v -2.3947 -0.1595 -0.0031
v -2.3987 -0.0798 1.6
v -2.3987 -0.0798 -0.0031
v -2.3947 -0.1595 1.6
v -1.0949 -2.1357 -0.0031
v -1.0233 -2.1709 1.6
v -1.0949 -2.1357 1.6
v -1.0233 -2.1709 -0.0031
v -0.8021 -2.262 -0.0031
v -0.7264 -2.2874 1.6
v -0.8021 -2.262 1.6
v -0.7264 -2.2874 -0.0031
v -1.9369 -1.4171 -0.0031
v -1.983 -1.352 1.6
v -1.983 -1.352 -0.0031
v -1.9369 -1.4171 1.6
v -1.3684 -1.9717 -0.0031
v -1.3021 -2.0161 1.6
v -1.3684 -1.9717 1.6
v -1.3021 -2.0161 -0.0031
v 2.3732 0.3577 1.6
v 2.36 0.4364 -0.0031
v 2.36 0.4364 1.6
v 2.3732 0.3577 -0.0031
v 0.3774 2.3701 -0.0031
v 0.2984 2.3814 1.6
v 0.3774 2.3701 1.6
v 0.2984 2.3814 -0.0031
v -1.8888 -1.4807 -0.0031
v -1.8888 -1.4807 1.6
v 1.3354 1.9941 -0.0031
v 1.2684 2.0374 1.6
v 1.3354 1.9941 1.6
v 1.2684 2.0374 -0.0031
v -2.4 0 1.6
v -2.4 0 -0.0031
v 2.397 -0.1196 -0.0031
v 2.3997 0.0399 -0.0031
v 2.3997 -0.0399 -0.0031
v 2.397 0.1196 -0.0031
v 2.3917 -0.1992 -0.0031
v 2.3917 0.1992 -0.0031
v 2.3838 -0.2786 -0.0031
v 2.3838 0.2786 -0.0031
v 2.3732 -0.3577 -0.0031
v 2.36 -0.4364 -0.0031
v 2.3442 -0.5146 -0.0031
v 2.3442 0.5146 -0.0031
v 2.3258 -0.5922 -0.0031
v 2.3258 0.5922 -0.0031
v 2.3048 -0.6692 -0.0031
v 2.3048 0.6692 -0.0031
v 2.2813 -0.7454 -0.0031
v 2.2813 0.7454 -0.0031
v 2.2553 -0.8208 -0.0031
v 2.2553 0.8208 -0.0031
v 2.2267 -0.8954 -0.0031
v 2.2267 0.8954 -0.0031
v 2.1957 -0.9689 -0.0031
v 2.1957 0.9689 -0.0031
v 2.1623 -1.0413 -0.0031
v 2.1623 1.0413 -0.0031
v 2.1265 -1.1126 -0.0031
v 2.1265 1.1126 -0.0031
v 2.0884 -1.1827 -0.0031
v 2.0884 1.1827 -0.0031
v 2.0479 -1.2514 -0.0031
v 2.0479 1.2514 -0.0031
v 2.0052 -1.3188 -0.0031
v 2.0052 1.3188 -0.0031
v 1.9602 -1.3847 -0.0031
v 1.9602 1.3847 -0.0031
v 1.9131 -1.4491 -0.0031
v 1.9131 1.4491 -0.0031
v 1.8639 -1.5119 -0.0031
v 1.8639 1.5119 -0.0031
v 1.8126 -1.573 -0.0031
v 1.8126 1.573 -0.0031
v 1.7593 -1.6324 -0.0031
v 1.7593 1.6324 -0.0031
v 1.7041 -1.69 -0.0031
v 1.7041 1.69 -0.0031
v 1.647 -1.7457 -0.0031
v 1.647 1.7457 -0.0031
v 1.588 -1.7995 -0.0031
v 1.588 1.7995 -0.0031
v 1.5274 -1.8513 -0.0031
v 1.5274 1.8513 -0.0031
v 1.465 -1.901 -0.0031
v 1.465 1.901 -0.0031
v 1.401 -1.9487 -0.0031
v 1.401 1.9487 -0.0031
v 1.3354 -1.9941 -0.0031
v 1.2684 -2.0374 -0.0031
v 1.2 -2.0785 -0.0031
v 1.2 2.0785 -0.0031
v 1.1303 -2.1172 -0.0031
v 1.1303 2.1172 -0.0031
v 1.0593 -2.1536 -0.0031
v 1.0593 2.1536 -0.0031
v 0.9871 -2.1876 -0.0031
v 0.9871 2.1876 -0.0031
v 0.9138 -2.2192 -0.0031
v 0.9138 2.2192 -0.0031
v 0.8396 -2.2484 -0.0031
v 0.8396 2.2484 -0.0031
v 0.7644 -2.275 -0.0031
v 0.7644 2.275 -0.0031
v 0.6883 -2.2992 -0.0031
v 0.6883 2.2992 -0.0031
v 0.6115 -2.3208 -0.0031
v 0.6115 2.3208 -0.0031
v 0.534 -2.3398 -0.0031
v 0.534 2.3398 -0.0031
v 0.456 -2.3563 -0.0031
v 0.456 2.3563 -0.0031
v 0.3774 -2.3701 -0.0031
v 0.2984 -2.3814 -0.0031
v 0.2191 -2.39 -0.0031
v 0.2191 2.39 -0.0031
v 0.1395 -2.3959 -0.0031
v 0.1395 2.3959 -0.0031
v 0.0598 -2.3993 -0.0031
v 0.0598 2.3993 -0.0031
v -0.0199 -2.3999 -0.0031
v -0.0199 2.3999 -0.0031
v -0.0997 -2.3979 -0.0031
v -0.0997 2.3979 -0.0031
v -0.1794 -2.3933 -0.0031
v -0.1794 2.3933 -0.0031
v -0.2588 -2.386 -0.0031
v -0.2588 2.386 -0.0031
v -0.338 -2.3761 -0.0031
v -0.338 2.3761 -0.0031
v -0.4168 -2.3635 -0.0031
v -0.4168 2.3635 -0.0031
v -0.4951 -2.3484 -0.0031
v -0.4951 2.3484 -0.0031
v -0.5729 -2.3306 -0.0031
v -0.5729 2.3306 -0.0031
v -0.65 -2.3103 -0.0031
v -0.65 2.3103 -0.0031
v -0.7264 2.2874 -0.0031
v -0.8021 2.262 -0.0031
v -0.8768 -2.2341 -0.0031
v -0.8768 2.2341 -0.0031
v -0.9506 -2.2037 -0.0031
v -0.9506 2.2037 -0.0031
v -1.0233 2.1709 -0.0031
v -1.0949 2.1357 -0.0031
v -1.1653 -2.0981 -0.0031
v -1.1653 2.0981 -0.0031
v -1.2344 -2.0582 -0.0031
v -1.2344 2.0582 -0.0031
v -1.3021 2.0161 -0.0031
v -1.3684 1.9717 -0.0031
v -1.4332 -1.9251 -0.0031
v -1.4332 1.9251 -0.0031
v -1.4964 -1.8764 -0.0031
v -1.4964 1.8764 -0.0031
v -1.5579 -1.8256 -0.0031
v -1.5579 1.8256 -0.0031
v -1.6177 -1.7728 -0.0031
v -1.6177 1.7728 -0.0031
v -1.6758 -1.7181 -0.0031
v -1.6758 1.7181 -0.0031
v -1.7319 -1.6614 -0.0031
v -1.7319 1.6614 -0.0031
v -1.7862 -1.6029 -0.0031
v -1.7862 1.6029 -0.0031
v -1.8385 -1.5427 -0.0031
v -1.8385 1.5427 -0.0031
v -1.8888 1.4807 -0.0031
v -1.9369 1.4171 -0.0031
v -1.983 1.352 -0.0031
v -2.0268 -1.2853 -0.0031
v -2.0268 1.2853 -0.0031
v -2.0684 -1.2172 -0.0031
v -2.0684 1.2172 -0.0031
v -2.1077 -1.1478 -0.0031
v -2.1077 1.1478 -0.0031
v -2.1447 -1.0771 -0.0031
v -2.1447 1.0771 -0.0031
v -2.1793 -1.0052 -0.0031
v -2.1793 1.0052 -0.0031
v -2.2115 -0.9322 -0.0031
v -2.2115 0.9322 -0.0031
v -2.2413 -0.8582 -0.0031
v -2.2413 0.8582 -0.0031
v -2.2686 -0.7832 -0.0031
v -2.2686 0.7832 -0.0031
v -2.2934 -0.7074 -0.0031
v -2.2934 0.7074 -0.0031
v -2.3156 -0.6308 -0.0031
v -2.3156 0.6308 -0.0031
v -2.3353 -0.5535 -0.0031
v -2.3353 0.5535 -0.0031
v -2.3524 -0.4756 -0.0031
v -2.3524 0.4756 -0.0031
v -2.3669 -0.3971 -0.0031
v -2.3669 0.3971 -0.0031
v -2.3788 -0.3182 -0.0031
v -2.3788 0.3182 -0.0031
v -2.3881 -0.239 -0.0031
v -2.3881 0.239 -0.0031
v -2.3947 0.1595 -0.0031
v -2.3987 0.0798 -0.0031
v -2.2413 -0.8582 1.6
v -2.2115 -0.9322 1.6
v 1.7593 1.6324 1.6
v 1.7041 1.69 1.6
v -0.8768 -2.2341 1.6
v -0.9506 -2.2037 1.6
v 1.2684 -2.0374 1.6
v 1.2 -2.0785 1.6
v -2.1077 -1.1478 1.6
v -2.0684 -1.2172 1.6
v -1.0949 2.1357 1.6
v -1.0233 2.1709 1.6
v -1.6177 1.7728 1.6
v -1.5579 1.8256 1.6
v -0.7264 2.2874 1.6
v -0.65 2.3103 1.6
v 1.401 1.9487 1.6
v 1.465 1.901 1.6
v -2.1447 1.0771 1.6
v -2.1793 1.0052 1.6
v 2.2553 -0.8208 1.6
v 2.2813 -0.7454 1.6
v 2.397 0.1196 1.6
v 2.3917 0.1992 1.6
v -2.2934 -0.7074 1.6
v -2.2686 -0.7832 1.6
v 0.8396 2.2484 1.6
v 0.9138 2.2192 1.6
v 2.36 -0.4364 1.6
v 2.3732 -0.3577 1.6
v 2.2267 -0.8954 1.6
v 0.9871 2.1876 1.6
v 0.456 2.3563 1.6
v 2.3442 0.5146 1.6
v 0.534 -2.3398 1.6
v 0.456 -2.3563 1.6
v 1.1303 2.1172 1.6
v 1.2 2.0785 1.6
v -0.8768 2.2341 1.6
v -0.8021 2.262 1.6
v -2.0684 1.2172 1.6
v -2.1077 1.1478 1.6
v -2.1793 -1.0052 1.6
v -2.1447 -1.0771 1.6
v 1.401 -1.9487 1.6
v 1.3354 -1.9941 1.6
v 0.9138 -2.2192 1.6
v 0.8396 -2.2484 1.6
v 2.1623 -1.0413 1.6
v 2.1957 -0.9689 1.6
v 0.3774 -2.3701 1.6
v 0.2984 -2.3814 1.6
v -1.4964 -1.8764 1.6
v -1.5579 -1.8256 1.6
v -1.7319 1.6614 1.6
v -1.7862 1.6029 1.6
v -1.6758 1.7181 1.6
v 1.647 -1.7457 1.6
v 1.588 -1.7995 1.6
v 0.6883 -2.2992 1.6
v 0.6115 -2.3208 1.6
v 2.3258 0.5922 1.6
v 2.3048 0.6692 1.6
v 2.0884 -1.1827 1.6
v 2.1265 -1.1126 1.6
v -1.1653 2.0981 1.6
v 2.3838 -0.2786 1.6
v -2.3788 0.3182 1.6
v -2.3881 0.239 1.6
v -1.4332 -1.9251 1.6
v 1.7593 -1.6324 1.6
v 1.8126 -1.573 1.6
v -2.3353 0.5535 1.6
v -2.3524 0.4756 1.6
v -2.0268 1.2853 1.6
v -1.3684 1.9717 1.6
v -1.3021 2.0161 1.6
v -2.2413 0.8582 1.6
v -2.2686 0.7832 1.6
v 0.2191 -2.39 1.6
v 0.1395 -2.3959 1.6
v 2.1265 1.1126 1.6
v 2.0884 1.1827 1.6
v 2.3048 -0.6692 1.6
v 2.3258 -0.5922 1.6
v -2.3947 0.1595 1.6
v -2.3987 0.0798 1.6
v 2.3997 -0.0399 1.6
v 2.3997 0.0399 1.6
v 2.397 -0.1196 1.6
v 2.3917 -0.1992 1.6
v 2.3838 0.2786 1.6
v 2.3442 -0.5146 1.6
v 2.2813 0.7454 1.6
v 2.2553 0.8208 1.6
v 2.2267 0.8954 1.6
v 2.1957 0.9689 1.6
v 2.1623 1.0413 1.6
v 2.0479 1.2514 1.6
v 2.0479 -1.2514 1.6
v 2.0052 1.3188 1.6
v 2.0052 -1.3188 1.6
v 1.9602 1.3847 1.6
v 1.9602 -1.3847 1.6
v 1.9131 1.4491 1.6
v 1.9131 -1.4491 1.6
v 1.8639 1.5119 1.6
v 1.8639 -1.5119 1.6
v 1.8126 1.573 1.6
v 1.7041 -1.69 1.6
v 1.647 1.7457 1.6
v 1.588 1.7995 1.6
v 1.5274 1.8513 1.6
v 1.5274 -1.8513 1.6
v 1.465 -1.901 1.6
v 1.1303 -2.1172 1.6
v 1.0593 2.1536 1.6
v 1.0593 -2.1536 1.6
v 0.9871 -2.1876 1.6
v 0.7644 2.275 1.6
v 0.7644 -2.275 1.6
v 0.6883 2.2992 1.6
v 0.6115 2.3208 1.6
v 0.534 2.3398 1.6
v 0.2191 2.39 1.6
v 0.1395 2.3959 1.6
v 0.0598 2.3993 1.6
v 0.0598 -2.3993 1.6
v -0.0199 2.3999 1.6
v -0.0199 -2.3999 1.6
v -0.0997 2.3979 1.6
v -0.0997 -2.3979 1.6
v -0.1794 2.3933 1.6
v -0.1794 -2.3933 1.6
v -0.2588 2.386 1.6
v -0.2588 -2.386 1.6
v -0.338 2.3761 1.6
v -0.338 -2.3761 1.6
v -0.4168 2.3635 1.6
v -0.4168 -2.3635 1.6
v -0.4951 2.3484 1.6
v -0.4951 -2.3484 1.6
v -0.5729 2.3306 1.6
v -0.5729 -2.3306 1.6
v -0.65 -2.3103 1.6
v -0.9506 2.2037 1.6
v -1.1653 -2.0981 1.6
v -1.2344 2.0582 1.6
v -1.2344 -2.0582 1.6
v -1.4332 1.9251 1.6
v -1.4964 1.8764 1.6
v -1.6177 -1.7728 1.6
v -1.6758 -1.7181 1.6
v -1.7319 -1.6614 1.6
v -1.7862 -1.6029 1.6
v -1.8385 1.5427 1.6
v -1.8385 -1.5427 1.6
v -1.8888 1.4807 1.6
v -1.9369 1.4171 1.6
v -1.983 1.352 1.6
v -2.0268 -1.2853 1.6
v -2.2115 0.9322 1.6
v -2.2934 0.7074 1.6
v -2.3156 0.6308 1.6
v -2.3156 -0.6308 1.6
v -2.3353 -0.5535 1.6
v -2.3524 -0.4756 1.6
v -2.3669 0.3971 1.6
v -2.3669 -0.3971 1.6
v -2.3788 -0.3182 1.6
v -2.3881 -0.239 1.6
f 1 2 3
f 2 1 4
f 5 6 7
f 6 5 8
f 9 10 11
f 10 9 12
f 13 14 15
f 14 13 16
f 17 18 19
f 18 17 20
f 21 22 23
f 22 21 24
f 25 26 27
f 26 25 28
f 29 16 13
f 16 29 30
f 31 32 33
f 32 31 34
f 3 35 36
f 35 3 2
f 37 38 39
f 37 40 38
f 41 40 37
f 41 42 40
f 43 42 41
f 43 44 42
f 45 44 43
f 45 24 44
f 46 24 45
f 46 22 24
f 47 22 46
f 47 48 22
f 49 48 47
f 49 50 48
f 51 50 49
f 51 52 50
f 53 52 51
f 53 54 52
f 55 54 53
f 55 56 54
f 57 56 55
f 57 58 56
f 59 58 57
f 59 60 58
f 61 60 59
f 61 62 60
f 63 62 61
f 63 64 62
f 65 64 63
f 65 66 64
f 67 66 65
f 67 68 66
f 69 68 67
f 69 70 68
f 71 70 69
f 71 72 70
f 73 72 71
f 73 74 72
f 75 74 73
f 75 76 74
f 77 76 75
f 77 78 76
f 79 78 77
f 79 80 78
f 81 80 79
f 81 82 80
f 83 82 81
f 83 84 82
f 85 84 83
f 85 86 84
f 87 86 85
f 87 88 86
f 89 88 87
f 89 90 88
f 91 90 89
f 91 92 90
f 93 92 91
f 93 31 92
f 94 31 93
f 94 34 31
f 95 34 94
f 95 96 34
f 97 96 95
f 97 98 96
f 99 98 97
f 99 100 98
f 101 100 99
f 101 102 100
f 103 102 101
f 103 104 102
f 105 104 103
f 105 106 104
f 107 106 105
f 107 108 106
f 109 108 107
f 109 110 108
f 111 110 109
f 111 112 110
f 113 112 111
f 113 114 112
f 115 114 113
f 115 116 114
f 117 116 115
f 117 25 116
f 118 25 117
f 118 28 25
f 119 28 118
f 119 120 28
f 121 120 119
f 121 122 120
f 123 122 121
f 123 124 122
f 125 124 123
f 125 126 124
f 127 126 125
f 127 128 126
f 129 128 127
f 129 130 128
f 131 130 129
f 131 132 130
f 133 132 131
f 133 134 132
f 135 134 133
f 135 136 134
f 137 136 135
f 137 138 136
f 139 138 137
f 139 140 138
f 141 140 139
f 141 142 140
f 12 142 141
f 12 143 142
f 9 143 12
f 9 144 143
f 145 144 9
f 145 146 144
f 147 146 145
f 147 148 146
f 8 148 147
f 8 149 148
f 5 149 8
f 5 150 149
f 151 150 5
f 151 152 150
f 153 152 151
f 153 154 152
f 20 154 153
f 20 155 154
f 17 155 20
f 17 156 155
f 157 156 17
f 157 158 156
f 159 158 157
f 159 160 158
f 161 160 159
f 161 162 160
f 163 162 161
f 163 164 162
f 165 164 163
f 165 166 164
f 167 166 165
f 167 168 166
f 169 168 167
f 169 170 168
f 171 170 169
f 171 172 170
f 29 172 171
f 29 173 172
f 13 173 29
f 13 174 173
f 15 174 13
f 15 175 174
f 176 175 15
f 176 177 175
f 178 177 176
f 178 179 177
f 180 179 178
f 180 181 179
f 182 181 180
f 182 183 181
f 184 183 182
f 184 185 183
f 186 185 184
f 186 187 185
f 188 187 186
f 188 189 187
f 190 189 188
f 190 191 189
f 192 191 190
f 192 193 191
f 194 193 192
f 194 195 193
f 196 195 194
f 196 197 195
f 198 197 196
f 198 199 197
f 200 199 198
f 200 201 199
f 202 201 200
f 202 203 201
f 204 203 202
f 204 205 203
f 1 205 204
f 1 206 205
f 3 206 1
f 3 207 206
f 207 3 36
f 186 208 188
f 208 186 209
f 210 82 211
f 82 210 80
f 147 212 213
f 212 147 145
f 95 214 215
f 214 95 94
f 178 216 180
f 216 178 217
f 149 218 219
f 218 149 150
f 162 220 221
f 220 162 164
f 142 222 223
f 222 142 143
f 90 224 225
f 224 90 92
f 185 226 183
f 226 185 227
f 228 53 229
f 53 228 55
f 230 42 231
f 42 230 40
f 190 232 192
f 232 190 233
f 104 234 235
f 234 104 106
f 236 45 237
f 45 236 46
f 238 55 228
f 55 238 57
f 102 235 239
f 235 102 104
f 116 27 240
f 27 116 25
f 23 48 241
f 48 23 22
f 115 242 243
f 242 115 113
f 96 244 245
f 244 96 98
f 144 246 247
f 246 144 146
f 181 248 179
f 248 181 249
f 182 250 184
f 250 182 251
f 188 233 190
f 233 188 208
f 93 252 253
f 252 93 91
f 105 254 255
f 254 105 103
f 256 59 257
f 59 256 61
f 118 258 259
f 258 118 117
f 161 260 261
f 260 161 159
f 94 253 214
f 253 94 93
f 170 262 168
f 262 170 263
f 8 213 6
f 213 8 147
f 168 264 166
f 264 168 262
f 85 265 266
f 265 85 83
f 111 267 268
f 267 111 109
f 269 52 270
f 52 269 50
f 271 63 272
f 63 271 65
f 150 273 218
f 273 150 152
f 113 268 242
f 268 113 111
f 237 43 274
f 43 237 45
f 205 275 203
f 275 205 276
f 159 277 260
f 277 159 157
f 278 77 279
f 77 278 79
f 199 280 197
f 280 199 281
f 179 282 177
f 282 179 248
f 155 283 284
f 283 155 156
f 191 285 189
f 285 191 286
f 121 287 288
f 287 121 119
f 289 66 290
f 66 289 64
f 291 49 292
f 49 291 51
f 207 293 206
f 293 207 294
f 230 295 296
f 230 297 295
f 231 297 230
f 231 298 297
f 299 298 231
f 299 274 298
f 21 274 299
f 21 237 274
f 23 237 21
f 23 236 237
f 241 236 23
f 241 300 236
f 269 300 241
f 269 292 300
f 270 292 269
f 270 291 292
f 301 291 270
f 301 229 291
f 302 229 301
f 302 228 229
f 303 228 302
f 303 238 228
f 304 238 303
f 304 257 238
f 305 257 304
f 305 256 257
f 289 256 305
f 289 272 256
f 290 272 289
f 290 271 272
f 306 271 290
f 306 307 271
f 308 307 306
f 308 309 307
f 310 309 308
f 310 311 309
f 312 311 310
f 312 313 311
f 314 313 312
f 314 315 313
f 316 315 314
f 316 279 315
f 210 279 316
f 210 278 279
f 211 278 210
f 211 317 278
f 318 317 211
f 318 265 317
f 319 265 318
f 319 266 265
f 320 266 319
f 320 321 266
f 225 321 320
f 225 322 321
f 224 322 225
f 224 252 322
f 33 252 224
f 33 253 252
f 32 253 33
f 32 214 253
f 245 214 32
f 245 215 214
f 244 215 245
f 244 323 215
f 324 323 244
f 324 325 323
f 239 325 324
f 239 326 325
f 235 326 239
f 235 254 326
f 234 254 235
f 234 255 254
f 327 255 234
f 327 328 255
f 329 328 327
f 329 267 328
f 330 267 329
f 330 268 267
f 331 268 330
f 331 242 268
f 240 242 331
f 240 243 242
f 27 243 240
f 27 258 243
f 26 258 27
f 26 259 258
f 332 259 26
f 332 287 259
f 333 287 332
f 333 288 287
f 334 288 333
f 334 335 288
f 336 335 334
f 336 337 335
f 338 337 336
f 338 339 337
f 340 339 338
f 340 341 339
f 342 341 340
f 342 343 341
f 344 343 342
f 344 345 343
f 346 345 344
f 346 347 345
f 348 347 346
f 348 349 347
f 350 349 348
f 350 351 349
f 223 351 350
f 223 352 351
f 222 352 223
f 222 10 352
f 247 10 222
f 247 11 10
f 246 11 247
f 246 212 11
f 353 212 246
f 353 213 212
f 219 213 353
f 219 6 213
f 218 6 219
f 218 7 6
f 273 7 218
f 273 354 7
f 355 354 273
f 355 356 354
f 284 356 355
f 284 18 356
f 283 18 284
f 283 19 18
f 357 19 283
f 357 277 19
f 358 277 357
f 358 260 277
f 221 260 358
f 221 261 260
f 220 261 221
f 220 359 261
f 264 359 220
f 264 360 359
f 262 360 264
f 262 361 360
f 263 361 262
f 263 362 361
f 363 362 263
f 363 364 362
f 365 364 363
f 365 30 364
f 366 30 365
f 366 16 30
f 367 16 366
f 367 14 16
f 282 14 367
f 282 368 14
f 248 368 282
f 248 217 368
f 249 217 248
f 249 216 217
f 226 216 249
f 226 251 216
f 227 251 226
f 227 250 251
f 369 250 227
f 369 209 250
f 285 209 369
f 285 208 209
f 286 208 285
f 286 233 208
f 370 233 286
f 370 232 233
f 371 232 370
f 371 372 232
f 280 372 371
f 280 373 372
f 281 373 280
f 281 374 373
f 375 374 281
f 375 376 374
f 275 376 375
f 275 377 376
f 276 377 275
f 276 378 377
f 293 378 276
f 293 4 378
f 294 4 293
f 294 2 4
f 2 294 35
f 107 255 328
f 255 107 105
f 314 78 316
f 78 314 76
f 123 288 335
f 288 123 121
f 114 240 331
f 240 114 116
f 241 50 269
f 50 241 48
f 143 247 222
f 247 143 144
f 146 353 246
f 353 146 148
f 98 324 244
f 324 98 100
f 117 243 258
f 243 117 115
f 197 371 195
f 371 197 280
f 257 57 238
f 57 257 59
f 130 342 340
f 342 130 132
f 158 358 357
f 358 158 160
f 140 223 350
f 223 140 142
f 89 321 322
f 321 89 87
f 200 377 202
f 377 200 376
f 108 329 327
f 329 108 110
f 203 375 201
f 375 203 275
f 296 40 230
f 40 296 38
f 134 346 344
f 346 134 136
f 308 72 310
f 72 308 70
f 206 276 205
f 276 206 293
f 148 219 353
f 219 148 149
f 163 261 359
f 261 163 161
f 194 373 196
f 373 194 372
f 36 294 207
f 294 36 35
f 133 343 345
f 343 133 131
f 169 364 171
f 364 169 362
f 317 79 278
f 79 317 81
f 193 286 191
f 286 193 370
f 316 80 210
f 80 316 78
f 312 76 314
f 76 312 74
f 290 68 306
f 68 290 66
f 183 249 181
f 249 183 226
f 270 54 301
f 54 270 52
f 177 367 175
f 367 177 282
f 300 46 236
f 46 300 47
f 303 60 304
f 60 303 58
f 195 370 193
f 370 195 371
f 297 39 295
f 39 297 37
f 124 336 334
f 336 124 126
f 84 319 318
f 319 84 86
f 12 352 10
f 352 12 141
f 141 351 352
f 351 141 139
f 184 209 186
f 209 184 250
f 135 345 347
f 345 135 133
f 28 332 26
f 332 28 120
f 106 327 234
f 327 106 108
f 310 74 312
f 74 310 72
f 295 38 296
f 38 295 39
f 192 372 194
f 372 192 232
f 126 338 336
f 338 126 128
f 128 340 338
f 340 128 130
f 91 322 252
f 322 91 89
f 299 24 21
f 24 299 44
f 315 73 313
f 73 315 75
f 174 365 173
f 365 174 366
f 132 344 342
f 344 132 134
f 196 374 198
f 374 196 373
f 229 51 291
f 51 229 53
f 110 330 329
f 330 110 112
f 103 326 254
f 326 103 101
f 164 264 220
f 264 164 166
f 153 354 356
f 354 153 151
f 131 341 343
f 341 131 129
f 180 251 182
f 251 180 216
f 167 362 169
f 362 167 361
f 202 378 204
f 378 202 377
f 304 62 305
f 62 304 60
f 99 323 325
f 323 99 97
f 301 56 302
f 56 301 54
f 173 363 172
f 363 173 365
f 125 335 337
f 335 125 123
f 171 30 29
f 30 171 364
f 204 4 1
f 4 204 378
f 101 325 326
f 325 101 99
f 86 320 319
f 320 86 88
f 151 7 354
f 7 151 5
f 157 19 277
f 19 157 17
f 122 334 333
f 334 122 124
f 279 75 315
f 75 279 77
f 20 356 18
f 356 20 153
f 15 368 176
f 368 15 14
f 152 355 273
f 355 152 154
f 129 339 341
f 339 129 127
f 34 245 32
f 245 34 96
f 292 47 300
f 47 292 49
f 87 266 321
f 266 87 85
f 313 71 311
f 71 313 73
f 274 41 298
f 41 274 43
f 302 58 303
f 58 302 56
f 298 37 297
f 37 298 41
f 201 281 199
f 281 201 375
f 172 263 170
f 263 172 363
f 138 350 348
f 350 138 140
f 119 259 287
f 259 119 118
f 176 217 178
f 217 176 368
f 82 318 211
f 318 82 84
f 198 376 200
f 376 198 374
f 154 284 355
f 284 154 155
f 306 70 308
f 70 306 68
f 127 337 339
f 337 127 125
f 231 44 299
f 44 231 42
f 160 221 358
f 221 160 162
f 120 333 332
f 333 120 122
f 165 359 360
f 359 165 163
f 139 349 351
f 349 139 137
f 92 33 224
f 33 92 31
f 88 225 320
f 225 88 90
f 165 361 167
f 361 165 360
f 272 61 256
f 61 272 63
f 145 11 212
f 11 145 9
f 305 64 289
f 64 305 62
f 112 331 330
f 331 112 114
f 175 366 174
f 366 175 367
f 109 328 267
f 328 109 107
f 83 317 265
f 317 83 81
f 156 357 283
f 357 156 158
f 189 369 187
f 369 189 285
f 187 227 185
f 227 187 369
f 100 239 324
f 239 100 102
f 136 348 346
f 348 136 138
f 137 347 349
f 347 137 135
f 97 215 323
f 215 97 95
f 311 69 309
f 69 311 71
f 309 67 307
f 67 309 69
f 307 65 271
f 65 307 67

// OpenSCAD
// file: ../p/stud3.scad
use <../lib.scad>
use <4-4cyli.scad>
use <4-4disc.scad>
use <4-4edge.scad>
$fa=1; $fs=0.2;
function ldraw_lib__stud3(realsolid=false) = realsolid ? 
    [openscad(translate([0,0,-eps()], o=cylinder(4+eps(), r=4)),2)] : [
// 0 Stud Tube Solid
// 0 Name: stud3.dat
// 0 Author: James Jessiman
// 0 !LDRAW_ORG Primitive UPDATE 2012-01
// 0 !LICENSE Licensed under CC BY 2.0 and CC BY 4.0 : see CAreadme.txt
// 
// 0 BFC CERTIFY CCW
  [0,"BFC","CERTIFY"],
  [0,"BFC","CCW"],
// 
// 0 !HISTORY 2002-04-04 [sbliss] Modified for BFC compliance
// 0 !HISTORY 2002-04-25 [PTadmin] Official Update 2002-02
// 0 !HISTORY 2007-06-24 [PTadmin] Header formatted for Contributor Agreement
// 0 !HISTORY 2008-07-01 [PTadmin] Official Update 2008-01
// 0 !HISTORY 2012-02-16 [Philo] Changed to CCW
// 0 !HISTORY 2012-03-30 [PTadmin] Official Update 2012-01
// 
// 
// 1 16 0 -4 0 4 0 0 0 1 0 0 0 4 4-4edge.dat
  [1,16,0,-4,0,4,0,0,0,1,0,0,0,4, ldraw_lib__4_4edge(realsolid)],
// 1 16 0 0 0 4 0 0 0 1 0 0 0 4 4-4edge.dat
  [1,16,0,0,0,4,0,0,0,1,0,0,0,4, ldraw_lib__4_4edge(realsolid)],
// 1 16 0 -4 0 4 0 0 0 1 0 0 0 4 4-4disc.dat
  [1,16,0,-4,0,4,0,0,0,1,0,0,0,4, ldraw_lib__4_4disc(realsolid)],
// 1 16 0 -4 0 4 0 0 0 4 0 0 0 4 4-4cyli.dat
  [1,16,0,-4,0,4,0,0,0,4,0,0,0,4, ldraw_lib__4_4cyli(realsolid)],
];
module ldraw_lib__stud3(step=0, col=false, unit=2/5, alt=false, line=0.2, solid=!$preview)
    makepoly(ldraw_lib__stud3(solid), step=step, col=col, unit=unit, alt=alt, line=line, solid=solid);
ldraw_lib__stud3(line=0.2);
// file: ../p/4-4edge.scad
use <../lib.scad>
$fa=1; $fs=0.2;
function ldraw_lib__4_4edge(realsolid=false) = [
// 0 Circle 1.0
// 0 Name: 4-4edge.dat
// 0 Author: James Jessiman
// 0 !LDRAW_ORG Primitive UPDATE 2017-01
// 0 !LICENSE Licensed under CC BY 2.0 and CC BY 4.0 : see CAreadme.txt
// 
// 0 BFC CERTIFY CCW
  [0,"BFC","CERTIFY"],
  [0,"BFC","CCW"],
// 
// 0 !HISTORY 1998-12-15 [PTadmin] Official Update 1998-10
// 0 !HISTORY 2005-12-28 [PTadmin] Official Update 2005-01
// 0 !HISTORY 2007-06-24 [PTadmin] Header formatted for Contributor Agreement
// 0 !HISTORY 2008-07-01 [PTadmin] Official Update 2008-01
// 0 !HISTORY 2017-01-15 [Steffen] BFCed
// 0 !HISTORY 2017-12-30 [PTadmin] Official Update 2017-01
// 
// 
// 2 24 1 0 0 0.9239 0 0.3827
  [2,24,1,0,0,0.9239,0,0.3827],
// 2 24 0.9239 0 0.3827 0.7071 0 0.7071
  [2,24,0.9239,0,0.3827,0.7071,0,0.7071],
// 2 24 0.7071 0 0.7071 0.3827 0 0.9239
  [2,24,0.7071,0,0.7071,0.3827,0,0.9239],
// 2 24 0.3827 0 0.9239 0 0 1
  [2,24,0.3827,0,0.9239,0,0,1],
// 2 24 0 0 1 -0.3827 0 0.9239
  [2,24,0,0,1,-0.3827,0,0.9239],
// 2 24 -0.3827 0 0.9239 -0.7071 0 0.7071
  [2,24,-0.3827,0,0.9239,-0.7071,0,0.7071],
// 2 24 -0.7071 0 0.7071 -0.9239 0 0.3827
  [2,24,-0.7071,0,0.7071,-0.9239,0,0.3827],
// 2 24 -0.9239 0 0.3827 -1 0 -0
  [2,24,-0.9239,0,0.3827,-1,0,-0],
// 2 24 -1 0 -0 -0.9239 0 -0.3827
  [2,24,-1,0,-0,-0.9239,0,-0.3827],
// 2 24 -0.9239 0 -0.3827 -0.7071 0 -0.7071
  [2,24,-0.9239,0,-0.3827,-0.7071,0,-0.7071],
// 2 24 -0.7071 0 -0.7071 -0.3827 0 -0.9239
  [2,24,-0.7071,0,-0.7071,-0.3827,0,-0.9239],
// 2 24 -0.3827 0 -0.9239 0 0 -1
  [2,24,-0.3827,0,-0.9239,0,0,-1],
// 2 24 0 0 -1 0.3827 0 -0.9239
  [2,24,0,0,-1,0.3827,0,-0.9239],
// 2 24 0.3827 0 -0.9239 0.7071 0 -0.7071
  [2,24,0.3827,0,-0.9239,0.7071,0,-0.7071],
// 2 24 0.7071 0 -0.7071 0.9239 0 -0.3827
  [2,24,0.7071,0,-0.7071,0.9239,0,-0.3827],
// 2 24 0.9239 0 -0.3827 1 0 0
  [2,24,0.9239,0,-0.3827,1,0,0],
];
module ldraw_lib__4_4edge(step=0, col=false, unit=2/5, alt=false, line=0.2, solid=!$preview)
    makepoly(ldraw_lib__4_4edge(solid), step=step, col=col, unit=unit, alt=alt, line=line, solid=solid);
ldraw_lib__4_4edge(line=0.2);
// file: ../p/4-4disc.scad
use <../lib.scad>
$fa=1; $fs=0.2;
function ldraw_lib__4_4disc(realsolid=false) = [
// 0 Disc 1.0
// 0 Name: 4-4disc.dat
// 0 Author: James Jessiman
// 0 !LDRAW_ORG Primitive UPDATE 2002-02
// 0 !LICENSE Licensed under CC BY 2.0 and CC BY 4.0 : see CAreadme.txt
// 
// 0 BFC CERTIFY CCW
  [0,"BFC","CERTIFY"],
  [0,"BFC","CCW"],
// 
// 0 !HISTORY 1998-12-15 [PTadmin] Official Update 1998-10
// 0 !HISTORY 2002-03-23 [sbliss] Added BFC statement
// 0 !HISTORY 2002-04-25 [PTadmin] Official Update 2002-02
// 0 !HISTORY 2007-06-24 [PTadmin] Header formatted for Contributor Agreement
// 0 !HISTORY 2008-07-01 [PTadmin] Official Update 2008-01
// 
// 
// 3 16 0 0 0 1 0 0 0.9239 0 0.3827
  [3,16,0,0,0,1,0,0,0.9239,0,0.3827],
// 3 16 0 0 0 0.9239 0 0.3827 0.7071 0 0.7071
  [3,16,0,0,0,0.9239,0,0.3827,0.7071,0,0.7071],
// 3 16 0 0 0 0.7071 0 0.7071 0.3827 0 0.9239
  [3,16,0,0,0,0.7071,0,0.7071,0.3827,0,0.9239],
// 3 16 0 0 0 0.3827 0 0.9239 0 0 1
  [3,16,0,0,0,0.3827,0,0.9239,0,0,1],
// 3 16 0 0 0 0 0 1 -0.3827 0 0.9239
  [3,16,0,0,0,0,0,1,-0.3827,0,0.9239],
// 3 16 0 0 0 -0.3827 0 0.9239 -0.7071 0 0.7071
  [3,16,0,0,0,-0.3827,0,0.9239,-0.7071,0,0.7071],
// 3 16 0 0 0 -0.7071 0 0.7071 -0.9239 0 0.3827
  [3,16,0,0,0,-0.7071,0,0.7071,-0.9239,0,0.3827],
// 3 16 0 0 0 -0.9239 0 0.3827 -1 0 -0
  [3,16,0,0,0,-0.9239,0,0.3827,-1,0,-0],
// 3 16 0 0 0 -1 0 -0 -0.9239 0 -0.3827
  [3,16,0,0,0,-1,0,-0,-0.9239,0,-0.3827],
// 3 16 0 0 0 -0.9239 0 -0.3827 -0.7071 0 -0.7071
  [3,16,0,0,0,-0.9239,0,-0.3827,-0.7071,0,-0.7071],
// 3 16 0 0 0 -0.7071 0 -0.7071 -0.3827 0 -0.9239
  [3,16,0,0,0,-0.7071,0,-0.7071,-0.3827,0,-0.9239],
// 3 16 0 0 0 -0.3827 0 -0.9239 0 0 -1
  [3,16,0,0,0,-0.3827,0,-0.9239,0,0,-1],
// 3 16 0 0 0 0 0 -1 0.3827 0 -0.9239
  [3,16,0,0,0,0,0,-1,0.3827,0,-0.9239],
// 3 16 0 0 0 0.3827 0 -0.9239 0.7071 0 -0.7071
  [3,16,0,0,0,0.3827,0,-0.9239,0.7071,0,-0.7071],
// 3 16 0 0 0 0.7071 0 -0.7071 0.9239 0 -0.3827
  [3,16,0,0,0,0.7071,0,-0.7071,0.9239,0,-0.3827],
// 3 16 0 0 0 0.9239 0 -0.3827 1 0 0
  [3,16,0,0,0,0.9239,0,-0.3827,1,0,0],
// 0
];
module ldraw_lib__4_4disc(step=0, col=false, unit=2/5, alt=false, line=0.2, solid=!$preview)
    makepoly(ldraw_lib__4_4disc(solid), step=step, col=col, unit=unit, alt=alt, line=line, solid=solid);
ldraw_lib__4_4disc(line=0.2);
// file: ../p/4-4cyli.scad
use <../lib.scad>
$fa=1; $fs=0.2;
function ldraw_lib__4_4cyli(realsolid=false) = [
// 0 Cylinder 1.0
// 0 Name: 4-4cyli.dat
// 0 Author: James Jessiman
// 0 !LDRAW_ORG Primitive UPDATE 2005-01
// 0 !LICENSE Licensed under CC BY 2.0 and CC BY 4.0 : see CAreadme.txt
// 
// 0 BFC CERTIFY CCW
  [0,"BFC","CERTIFY"],
  [0,"BFC","CCW"],
// 
// 0 !HISTORY 1998-12-15 [PTadmin] Official Update 1998-10
// 0 !HISTORY 2002-03-23 [sbliss] Added BFC statement; merged headers from files in distributions LDraw 0.27 and Complete.
// 0 !HISTORY 2002-04-25 [PTadmin] Official Update 2002-02
// 0 !HISTORY 2004-12-14 [guyvivan] BFC CCW
// 0 !HISTORY 2005-12-28 [PTadmin] Official Update 2005-01
// 0 !HISTORY 2007-06-24 [PTadmin] Header formatted for Contributor Agreement
// 0 !HISTORY 2008-07-01 [PTadmin] Official Update 2008-01
// 
// 
// 4 16 1 1 0 0.9239 1 0.3827 0.9239 0 0.3827 1 0 0
  [4,16,1,1,0,0.9239,1,0.3827,0.9239,0,0.3827,1,0,0],
// 5 24 1 0 0 1 1 0 0.9239 0 0.3827 0.9239 0 -0.3827
  [5,24,1,0,0,1,1,0,0.9239,0,0.3827,0.9239,0,-0.3827],
// 4 16 0.9239 1 0.3827 0.7071 1 0.7071 0.7071 0 0.7071 0.9239 0 0.3827
  [4,16,0.9239,1,0.3827,0.7071,1,0.7071,0.7071,0,0.7071,0.9239,0,0.3827],
// 5 24 0.9239 0 0.3827 0.9239 1 0.3827 0.7071 0 0.7071 1 0 0
  [5,24,0.9239,0,0.3827,0.9239,1,0.3827,0.7071,0,0.7071,1,0,0],
// 4 16 0.7071 1 0.7071 0.3827 1 0.9239 0.3827 0 0.9239 0.7071 0 0.7071
  [4,16,0.7071,1,0.7071,0.3827,1,0.9239,0.3827,0,0.9239,0.7071,0,0.7071],
// 5 24 0.7071 0 0.7071 0.7071 1 0.7071 0.3827 0 0.9239 0.9239 0 0.3827
  [5,24,0.7071,0,0.7071,0.7071,1,0.7071,0.3827,0,0.9239,0.9239,0,0.3827],
// 4 16 0.3827 1 0.9239 0 1 1 0 0 1 0.3827 0 0.9239
  [4,16,0.3827,1,0.9239,0,1,1,0,0,1,0.3827,0,0.9239],
// 5 24 0.3827 0 0.9239 0.3827 1 0.9239 0 0 1 0.7071 0 0.7071
  [5,24,0.3827,0,0.9239,0.3827,1,0.9239,0,0,1,0.7071,0,0.7071],
// 4 16 0 1 1 -0.3827 1 0.9239 -0.3827 0 0.9239 0 0 1
  [4,16,0,1,1,-0.3827,1,0.9239,-0.3827,0,0.9239,0,0,1],
// 5 24 0 0 1 0 1 1 -0.3827 0 0.9239 0.3827 0 0.9239
  [5,24,0,0,1,0,1,1,-0.3827,0,0.9239,0.3827,0,0.9239],
// 4 16 -0.3827 1 0.9239 -0.7071 1 0.7071 -0.7071 0 0.7071 -0.3827 0 0.9239
  [4,16,-0.3827,1,0.9239,-0.7071,1,0.7071,-0.7071,0,0.7071,-0.3827,0,0.9239],
// 5 24 -0.3827 0 0.9239 -0.3827 1 0.9239 -0.7071 0 0.7071 0 0 1
  [5,24,-0.3827,0,0.9239,-0.3827,1,0.9239,-0.7071,0,0.7071,0,0,1],
// 4 16 -0.7071 1 0.7071 -0.9239 1 0.3827 -0.9239 0 0.3827 -0.7071 0 0.7071
  [4,16,-0.7071,1,0.7071,-0.9239,1,0.3827,-0.9239,0,0.3827,-0.7071,0,0.7071],
// 5 24 -0.7071 0 0.7071 -0.7071 1 0.7071 -0.9239 0 0.3827 -0.3827 0 0.9239
  [5,24,-0.7071,0,0.7071,-0.7071,1,0.7071,-0.9239,0,0.3827,-0.3827,0,0.9239],
// 4 16 -0.9239 1 0.3827 -1 1 0 -1 0 0 -0.9239 0 0.3827
  [4,16,-0.9239,1,0.3827,-1,1,0,-1,0,0,-0.9239,0,0.3827],
// 5 24 -0.9239 0 0.3827 -0.9239 1 0.3827 -1 0 0 -0.7071 0 0.7071
  [5,24,-0.9239,0,0.3827,-0.9239,1,0.3827,-1,0,0,-0.7071,0,0.7071],
// 4 16 -1 1 0 -0.9239 1 -0.3827 -0.9239 0 -0.3827 -1 0 0
  [4,16,-1,1,0,-0.9239,1,-0.3827,-0.9239,0,-0.3827,-1,0,0],
// 5 24 -1 0 0 -1 1 0 -0.9239 0 -0.3827 -0.9239 0 0.3827
  [5,24,-1,0,0,-1,1,0,-0.9239,0,-0.3827,-0.9239,0,0.3827],
// 4 16 -0.9239 1 -0.3827 -0.7071 1 -0.7071 -0.7071 0 -0.7071 -0.9239 0 -0.3827
  [4,16,-0.9239,1,-0.3827,-0.7071,1,-0.7071,-0.7071,0,-0.7071,-0.9239,0,-0.3827],
// 5 24 -0.9239 0 -0.3827 -0.9239 1 -0.3827 -0.7071 0 -0.7071 -1 0 0
  [5,24,-0.9239,0,-0.3827,-0.9239,1,-0.3827,-0.7071,0,-0.7071,-1,0,0],
// 4 16 -0.7071 1 -0.7071 -0.3827 1 -0.9239 -0.3827 0 -0.9239 -0.7071 0 -0.7071
  [4,16,-0.7071,1,-0.7071,-0.3827,1,-0.9239,-0.3827,0,-0.9239,-0.7071,0,-0.7071],
// 5 24 -0.7071 0 -0.7071 -0.7071 1 -0.7071 -0.3827 0 -0.9239 -0.9239 0 -0.3827
  [5,24,-0.7071,0,-0.7071,-0.7071,1,-0.7071,-0.3827,0,-0.9239,-0.9239,0,-0.3827],
// 4 16 -0.3827 1 -0.9239 0 1 -1 0 0 -1 -0.3827 0 -0.9239
  [4,16,-0.3827,1,-0.9239,0,1,-1,0,0,-1,-0.3827,0,-0.9239],
// 5 24 -0.3827 0 -0.9239 -0.3827 1 -0.9239 0 0 -1 -0.7071 0 -0.7071
  [5,24,-0.3827,0,-0.9239,-0.3827,1,-0.9239,0,0,-1,-0.7071,0,-0.7071],
// 4 16 0 1 -1 0.3827 1 -0.9239 0.3827 0 -0.9239 0 0 -1
  [4,16,0,1,-1,0.3827,1,-0.9239,0.3827,0,-0.9239,0,0,-1],
// 5 24 0 0 -1 0 1 -1 0.3827 0 -0.9239 -0.3827 0 -0.9239
  [5,24,0,0,-1,0,1,-1,0.3827,0,-0.9239,-0.3827,0,-0.9239],
// 4 16 0.3827 1 -0.9239 0.7071 1 -0.7071 0.7071 0 -0.7071 0.3827 0 -0.9239
  [4,16,0.3827,1,-0.9239,0.7071,1,-0.7071,0.7071,0,-0.7071,0.3827,0,-0.9239],
// 5 24 0.3827 0 -0.9239 0.3827 1 -0.9239 0.7071 0 -0.7071 0 0 -1
  [5,24,0.3827,0,-0.9239,0.3827,1,-0.9239,0.7071,0,-0.7071,0,0,-1],
// 4 16 0.7071 1 -0.7071 0.9239 1 -0.3827 0.9239 0 -0.3827 0.7071 0 -0.7071
  [4,16,0.7071,1,-0.7071,0.9239,1,-0.3827,0.9239,0,-0.3827,0.7071,0,-0.7071],
// 5 24 0.7071 0 -0.7071 0.7071 1 -0.7071 0.9239 0 -0.3827 0.3827 0 -0.9239
  [5,24,0.7071,0,-0.7071,0.7071,1,-0.7071,0.9239,0,-0.3827,0.3827,0,-0.9239],
// 4 16 0.9239 1 -0.3827 1 1 0 1 0 0 0.9239 0 -0.3827
  [4,16,0.9239,1,-0.3827,1,1,0,1,0,0,0.9239,0,-0.3827],
// 5 24 0.9239 0 -0.3827 0.9239 1 -0.3827 1 0 0 0.7071 0 -0.7071
  [5,24,0.9239,0,-0.3827,0.9239,1,-0.3827,1,0,0,0.7071,0,-0.7071],
// 0
];
module ldraw_lib__4_4cyli(step=0, col=false, unit=2/5, alt=false, line=0.2, solid=!$preview)
    makepoly(ldraw_lib__4_4cyli(solid), step=step, col=col, unit=unit, alt=alt, line=line, solid=solid);
ldraw_lib__4_4cyli(line=0.2);
// file: s/3004s01.scad
use <../../lib.scad>
use <../../p/box4t.scad>
use <../../p/box5.scad>
use <../../p/stud.scad>
use <../../p/stud3.scad>
$fa=1; $fs=0.2;
function ldraw_lib__s__3004s01(realsolid=false) = [
// 0 ~Brick  1 x  2 without Front Face
// 0 Name: s\3004s01.dat
// 0 Author: James Jessiman
// 0 !LDRAW_ORG Subpart UPDATE 2003-03
// 0 !LICENSE Licensed under CC BY 2.0 and CC BY 4.0 : see CAreadme.txt
// 
// 0 BFC CERTIFY CCW
  [0,"BFC","CERTIFY"],
  [0,"BFC","CCW"],
// 
// 0 !HISTORY 2003-09-07 [jriley] Subfiling, BFC
// 0 !HISTORY 2003-12-19 [PTadmin] Official Update 2003-03
// 0 !HISTORY 2007-08-29 [PTadmin] Header formatted for Contributor Agreement
// 0 !HISTORY 2008-07-01 [PTadmin] Official Update 2008-01
// 
// 
// 1 16 0 4 0 1 0 0 0 -5 0 0 0 1 stud3.dat
  [1,16,0,4,0,1,0,0,0,-5,0,0,0,1, ldraw_lib__stud3(realsolid)],
// 0 BFC INVERTNEXT
  [0,"BFC","INVERTNEXT"],
// 1 16 0 24 0 16 0 0 0 -20 0 0 0 6 box5.dat
  [1,16,0,24,0,16,0,0,0,-20,0,0,0,6, ldraw_lib__box5(realsolid)],
// 4 16 20 24 10 16 24 6 -16 24 6 -20 24 10
  [4,16,20,24,10,16,24,6,-16,24,6,-20,24,10],
// 4 16 -20 24 10 -16 24 6 -16 24 -6 -20 24 -10
  [4,16,-20,24,10,-16,24,6,-16,24,-6,-20,24,-10],
// 4 16 -20 24 -10 -16 24 -6 16 24 -6 20 24 -10
  [4,16,-20,24,-10,-16,24,-6,16,24,-6,20,24,-10],
// 4 16 20 24 -10 16 24 -6 16 24 6 20 24 10
  [4,16,20,24,-10,16,24,-6,16,24,6,20,24,10],
// 1 16 0 24 0 20 0 0 0 -24 0 0 0 10 box4t.dat
  [1,16,0,24,0,20,0,0,0,-24,0,0,0,10, ldraw_lib__box4t(realsolid)],
// 1 16 10 0 0 1 0 0 0 1 0 0 0 1 stud.dat
  [1,16,10,0,0,1,0,0,0,1,0,0,0,1, ldraw_lib__stud(realsolid)],
// 1 16 -10 0 0 1 0 0 0 1 0 0 0 1 stud.dat
  [1,16,-10,0,0,1,0,0,0,1,0,0,0,1, ldraw_lib__stud(realsolid)],
// 0
];
module ldraw_lib__s__3004s01(step=0, col=false, unit=2/5, alt=false, line=0.2, solid=!$preview)
    makepoly(ldraw_lib__s__3004s01(solid), step=step, col=col, unit=unit, alt=alt, line=line, solid=solid);
ldraw_lib__s__3004s01(line=0.2);
// file: ../p/stud.scad
use <../lib.scad>
use <4-4cyli.scad>
use <4-4disc.scad>
use <4-4edge.scad>
$fa=1; $fs=0.2;
function ldraw_lib__stud(realsolid=false) = realsolid ? 
    [openscad(translate([0,0,-eps()], o=cylinder(4+eps(), r=6)),2)] : [
// 0 Stud
// 0 Name: stud.dat
// 0 Author: James Jessiman
// 0 !LDRAW_ORG Primitive UPDATE 2012-01
// 0 !LICENSE Licensed under CC BY 2.0 and CC BY 4.0 : see CAreadme.txt
// 
// 0 BFC CERTIFY CCW
  [0,"BFC","CERTIFY"],
  [0,"BFC","CCW"],
// 
// 0 !HISTORY 2002-04-04 [sbliss] Modified for BFC compliance
// 0 !HISTORY 2002-04-25 [PTadmin] Official Update 2002-02
// 0 !HISTORY 2007-06-24 [PTadmin] Header formatted for Contributor Agreement
// 0 !HISTORY 2008-07-01 [PTadmin] Official Update 2008-01
// 0 !HISTORY 2012-02-16 [Philo] Changed to CCW
// 0 !HISTORY 2012-03-30 [PTadmin] Official Update 2012-01
// 
// 
// 1 16 0 0 0 6 0 0 0 1 0 0 0 6 4-4edge.dat
  [1,16,0,0,0,6,0,0,0,1,0,0,0,6, ldraw_lib__4_4edge(realsolid)],
// 1 16 0 -4 0 6 0 0 0 1 0 0 0 6 4-4edge.dat
  [1,16,0,-4,0,6,0,0,0,1,0,0,0,6, ldraw_lib__4_4edge(realsolid)],
// 1 16 0 0 0 6 0 0 0 -4 0 0 0 6 4-4cyli.dat
  [1,16,0,0,0,6,0,0,0,-4,0,0,0,6, ldraw_lib__4_4cyli(realsolid)],
// 1 16 0 -4 0 6 0 0 0 1 0 0 0 6 4-4disc.dat
  [1,16,0,-4,0,6,0,0,0,1,0,0,0,6, ldraw_lib__4_4disc(realsolid)],
];
module ldraw_lib__stud(step=0, col=false, unit=2/5, alt=false, line=0.2, solid=!$preview)
    makepoly(ldraw_lib__stud(solid), step=step, col=col, unit=unit, alt=alt, line=line, solid=solid);
ldraw_lib__stud(line=0.2);
// file: ../p/box5.scad
use <../lib.scad>
$fa=1; $fs=0.2;
function ldraw_lib__box5(realsolid=false) = [
// 0 Box with 5 Faces and All Edges
// 0 Name: box5.dat
// 0 Author: James Jessiman
// 0 !LDRAW_ORG Primitive UPDATE 2012-01
// 0 !LICENSE Licensed under CC BY 2.0 and CC BY 4.0 : see CAreadme.txt
// 
// 0 BFC CERTIFY CCW
  [0,"BFC","CERTIFY"],
  [0,"BFC","CCW"],
// 
// 0 !HISTORY 2002-04-03 [sbliss] Modified for BFC compliance
// 0 !HISTORY 2002-04-25 [PTadmin] Official Update 2002-02
// 0 !HISTORY 2007-06-24 [PTadmin] Header formatted for Contributor Agreement
// 0 !HISTORY 2008-07-01 [PTadmin] Official Update 2008-01
// 0 !HISTORY 2012-02-16 [Philo] Changed to CCW
// 0 !HISTORY 2012-03-30 [PTadmin] Official Update 2012-01
// 
// 
// 2 24 1 1 1 -1 1 1
  [2,24,1,1,1,-1,1,1],
// 2 24 -1 1 1 -1 1 -1
  [2,24,-1,1,1,-1,1,-1],
// 2 24 -1 1 -1 1 1 -1
  [2,24,-1,1,-1,1,1,-1],
// 2 24 1 1 -1 1 1 1
  [2,24,1,1,-1,1,1,1],
// 2 24 1 0 1 -1 0 1
  [2,24,1,0,1,-1,0,1],
// 2 24 -1 0 1 -1 0 -1
  [2,24,-1,0,1,-1,0,-1],
// 2 24 -1 0 -1 1 0 -1
  [2,24,-1,0,-1,1,0,-1],
// 2 24 1 0 -1 1 0 1
  [2,24,1,0,-1,1,0,1],
// 2 24 1 0 1 1 1 1
  [2,24,1,0,1,1,1,1],
// 2 24 -1 0 1 -1 1 1
  [2,24,-1,0,1,-1,1,1],
// 2 24 1 0 -1 1 1 -1
  [2,24,1,0,-1,1,1,-1],
// 2 24 -1 0 -1 -1 1 -1
  [2,24,-1,0,-1,-1,1,-1],
// 4 16 -1 1 1 1 1 1 1 1 -1 -1 1 -1
  [4,16,-1,1,1,1,1,1,1,1,-1,-1,1,-1],
// 4 16 -1 1 1 -1 0 1 1 0 1 1 1 1
  [4,16,-1,1,1,-1,0,1,1,0,1,1,1,1],
// 4 16 -1 1 -1 -1 0 -1 -1 0 1 -1 1 1
  [4,16,-1,1,-1,-1,0,-1,-1,0,1,-1,1,1],
// 4 16 1 1 -1 1 0 -1 -1 0 -1 -1 1 -1
  [4,16,1,1,-1,1,0,-1,-1,0,-1,-1,1,-1],
// 4 16 1 1 1 1 0 1 1 0 -1 1 1 -1
  [4,16,1,1,1,1,0,1,1,0,-1,1,1,-1],
];
module ldraw_lib__box5(step=0, col=false, unit=2/5, alt=false, line=0.2, solid=!$preview)
    makepoly(ldraw_lib__box5(solid), step=step, col=col, unit=unit, alt=alt, line=line, solid=solid);
ldraw_lib__box5(line=0.2);
// file: ../p/box4t.scad
use <../lib.scad>
$fa=1; $fs=0.2;
function ldraw_lib__box4t(realsolid=false) = [
// 0 Box with 4 Adjacent Faces and All Edges
// 0 Name: box4t.dat
// 0 Author: Tore Eriksson [Tore_Eriksson]
// 0 !LDRAW_ORG Primitive UPDATE 2003-02
// 0 !LICENSE Licensed under CC BY 2.0 and CC BY 4.0 : see CAreadme.txt
// 
// 0 BFC CERTIFY CCW
  [0,"BFC","CERTIFY"],
  [0,"BFC","CCW"],
// 
// 0 !HISTORY 1997-09-29 [PTadmin] Official Update 1997-15
// 0 !HISTORY 2002-08-31 [izanette] Modified with WINDZ for BFC compliance
// 0 !HISTORY 2003-08-01 [PTadmin] Official Update 2003-02
// 0 !HISTORY 2007-06-24 [PTadmin] Header formatted for Contributor Agreement
// 0 !HISTORY 2008-07-01 [PTadmin] Official Update 2008-01
// 
// 
// 2 24 1 1 1 -1 1 1
  [2,24,1,1,1,-1,1,1],
// 2 24 -1 1 1 -1 1 -1
  [2,24,-1,1,1,-1,1,-1],
// 2 24 -1 1 -1 1 1 -1
  [2,24,-1,1,-1,1,1,-1],
// 2 24 1 1 -1 1 1 1
  [2,24,1,1,-1,1,1,1],
// 2 24 1 0 1 -1 0 1
  [2,24,1,0,1,-1,0,1],
// 2 24 -1 0 1 -1 0 -1
  [2,24,-1,0,1,-1,0,-1],
// 2 24 -1 0 -1 1 0 -1
  [2,24,-1,0,-1,1,0,-1],
// 2 24 1 0 -1 1 0 1
  [2,24,1,0,-1,1,0,1],
// 2 24 1 0 1 1 1 1
  [2,24,1,0,1,1,1,1],
// 2 24 -1 0 1 -1 1 1
  [2,24,-1,0,1,-1,1,1],
// 2 24 1 0 -1 1 1 -1
  [2,24,1,0,-1,1,1,-1],
// 2 24 -1 0 -1 -1 1 -1
  [2,24,-1,0,-1,-1,1,-1],
// 4 16 1 1 1 1 1 -1 -1 1 -1 -1 1 1
  [4,16,1,1,1,1,1,-1,-1,1,-1,-1,1,1],
// 4 16 1 1 1 -1 1 1 -1 0 1 1 0 1
  [4,16,1,1,1,-1,1,1,-1,0,1,1,0,1],
// 4 16 -1 1 1 -1 1 -1 -1 0 -1 -1 0 1
  [4,16,-1,1,1,-1,1,-1,-1,0,-1,-1,0,1],
// 0 4 16 -1 1 -1 -1 0 -1 1 0 -1 1 1 -1
// 4 16 1 1 -1 1 1 1 1 0 1 1 0 -1
  [4,16,1,1,-1,1,1,1,1,0,1,1,0,-1],
// 0
];
module ldraw_lib__box4t(step=0, col=false, unit=2/5, alt=false, line=0.2, solid=!$preview)
    makepoly(ldraw_lib__box4t(solid), step=step, col=col, unit=unit, alt=alt, line=line, solid=solid);
ldraw_lib__box4t(line=0.2);
// file: 3004.scad
use <../lib.scad>
use <s/3004s01.scad>
$fa=1; $fs=0.2;
function ldraw_lib__3004(realsolid=false) = [
// 0 Brick  1 x  2
// 0 Name: 3004.dat
// 0 Author: James Jessiman
// 0 !LDRAW_ORG Part UPDATE 2022-05
// 0 !LICENSE Licensed under CC BY 2.0 and CC BY 4.0 : see CAreadme.txt
// 
// 0 BFC CERTIFY CCW
  [0,"BFC","CERTIFY"],
  [0,"BFC","CCW"],
// 
// 0 !HISTORY 2001-10-26 [PTadmin] Official Update 2001-01
// 0 !HISTORY 2002-05-07 {unknown} BFC Certification
// 0 !HISTORY 2002-06-11 [PTadmin] Official Update 2002-03
// 0 !HISTORY 2007-05-07 [PTadmin] Header formatted for Contributor Agreement
// 0 !HISTORY 2008-07-01 [PTadmin] Official Update 2008-01
// 0 !HISTORY 2022-08-04 [MagFors] Using subfile
// 0 !HISTORY 2022-09-15 [PTadmin] Official Update 2022-05
// 
// 
// 1 16 0 0 0 1 0 0 0 1 0 0 0 1 s\3004s01.dat
  [1,16,0,0,0,1,0,0,0,1,0,0,0,1, ldraw_lib__s__3004s01(realsolid)],
// 4 16 -20 24 -10 20 24 -10 20 0 -10 -20 0 -10
  [4,16,-20,24,-10,20,24,-10,20,0,-10,-20,0,-10],
];
module ldraw_lib__3004(step=0, col=false, unit=2/5, alt=false, line=0.2, solid=!$preview)
    makepoly(ldraw_lib__3004(solid), step=step, col=col, unit=unit, alt=alt, line=line, solid=solid);
ldraw_lib__3004(line=0.2);
// file: s/3005s01.scad
use <../../lib.scad>
use <../../p/box4t.scad>
use <../../p/box5.scad>
use <../../p/stud.scad>
$fa=1; $fs=0.2;
function ldraw_lib__s__3005s01(realsolid=false) = [
// 0 ~Brick  1 x  1 without Front Face
// 0 Name: s\3005s01.dat
// 0 Author: John Riley [jriley]
// 0 !LDRAW_ORG Subpart UPDATE 2004-01
// 0 !LICENSE Licensed under CC BY 2.0 and CC BY 4.0 : see CAreadme.txt
// 
// 0 BFC CERTIFY CCW
  [0,"BFC","CERTIFY"],
  [0,"BFC","CCW"],
// 
// 0 !HISTORY 2003-09-07 [jriley] BFCed & Subfiled
// 0 !HISTORY 2004-03-02 [PTadmin] Official Update 2004-01
// 0 !HISTORY 2007-08-29 [PTadmin] Header formatted for Contributor Agreement
// 0 !HISTORY 2008-07-01 [PTadmin] Official Update 2008-01
// 
// 
// 0 BFC INVERTNEXT
  [0,"BFC","INVERTNEXT"],
// 1 16 0 24 0 0 0 6 0 -20 0 -6 0 0 box5.dat
  [1,16,0,24,0,0,0,6,0,-20,0,-6,0,0, ldraw_lib__box5(realsolid)],
// 4 16 10 24 -10 6 24 -6 6 24 6 10 24 10
  [4,16,10,24,-10,6,24,-6,6,24,6,10,24,10],
// 4 16 10 24 10 6 24 6 -6 24 6 -10 24 10
  [4,16,10,24,10,6,24,6,-6,24,6,-10,24,10],
// 4 16 -10 24 10 -6 24 6 -6 24 -6 -10 24 -10
  [4,16,-10,24,10,-6,24,6,-6,24,-6,-10,24,-10],
// 4 16 -10 24 -10 -6 24 -6 6 24 -6 10 24 -10
  [4,16,-10,24,-10,-6,24,-6,6,24,-6,10,24,-10],
// 1 16 0 24 0 10 0 0 0 -24 0 0 0 10 box4t.dat
  [1,16,0,24,0,10,0,0,0,-24,0,0,0,10, ldraw_lib__box4t(realsolid)],
// 1 16 0 0 0 0 0 1 0 1 0 -1 0 0 stud.dat
  [1,16,0,0,0,0,0,1,0,1,0,-1,0,0, ldraw_lib__stud(realsolid)],
// 0
];
module ldraw_lib__s__3005s01(step=0, col=false, unit=2/5, alt=false, line=0.2, solid=!$preview)
    makepoly(ldraw_lib__s__3005s01(solid), step=step, col=col, unit=unit, alt=alt, line=line, solid=solid);
ldraw_lib__s__3005s01(line=0.2);
// main file
use <../lib.scad>
use <s/3005s01.scad>
$fa=1; $fs=0.2;
function ldraw_lib__3005ptq(realsolid=false) = [
// 0 Brick  1 x  1 with Blue "Q" Pattern
// 0 Name: 3005ptq.dat
// 0 Author: Tore Eriksson [Tore_Eriksson]
// 0 !LDRAW_ORG Part UPDATE 2015-01
// 0 !LICENSE Licensed under CC BY 2.0 and CC BY 4.0 : see CAreadme.txt
// 
// 0 BFC CERTIFY CCW
  [0,"BFC","CERTIFY"],
  [0,"BFC","CCW"],
// 
// 0 !HISTORY 2003-12-09 [Steffen] made use of existing subfile
// 0 !HISTORY 2004-04-22 [PTadmin] Official Update 2004-02
// 0 !HISTORY 2007-05-11 [PTadmin] Header formatted for Contributor Agreement
// 0 !HISTORY 2008-07-01 [PTadmin] Official Update 2008-01
// 0 !HISTORY 2014-12-22 [Holly-Wood] Fixed T-Junction, BFCed
// 0 !HISTORY 2015-10-11 [PTadmin] Official Update 2015-01
// 
// 
// 0 // Pattern
// 4 1 4.769 10.086 -10 5.2 12 -10 7.2 12 -10 6.617 9.321 -10
  [4,1,4.769,10.086,-10,5.2,12,-10,7.2,12,-10,6.617,9.321,-10],
// 4 1 3.635 8.464 -10 4.769 10.086 -10 6.617 9.321 -10 5.05 7.05 -10
  [4,1,3.635,8.464,-10,4.769,10.086,-10,6.617,9.321,-10,5.05,7.05,-10],
// 4 1 2.063 7.38 -10 3.635 8.464 -10 5.05 7.05 -10 2.729 5.533 -10
  [4,1,2.063,7.38,-10,3.635,8.464,-10,5.05,7.05,-10,2.729,5.533,-10],
// 4 1 0 7 -10 2.063 7.38 -10 2.729 5.533 -10 0 5 -10
  [4,1,0,7,-10,2.063,7.38,-10,2.729,5.533,-10,0,5,-10],
// 4 1 -1.963 7.38 -10 0 7 -10 0 5 -10 -2.729 5.533 -10
  [4,1,-1.963,7.38,-10,0,7,-10,0,5,-10,-2.729,5.533,-10],
// 4 1 -3.635 8.464 -10 -1.963 7.38 -10 -2.729 5.533 -10 -5.05 7.05 -10
  [4,1,-3.635,8.464,-10,-1.963,7.38,-10,-2.729,5.533,-10,-5.05,7.05,-10],
// 4 1 -4.769 10.086 -10 -3.635 8.464 -10 -5.05 7.05 -10 -6.617 9.321 -10
  [4,1,-4.769,10.086,-10,-3.635,8.464,-10,-5.05,7.05,-10,-6.617,9.321,-10],
// 4 1 -5.2 12 -10 -4.769 10.086 -10 -6.617 9.321 -10 -7.2 12 -10
  [4,1,-5.2,12,-10,-4.769,10.086,-10,-6.617,9.321,-10,-7.2,12,-10],
// 4 1 -4.769 13.914 -10 -5.2 12 -10 -7.2 12 -10 -6.617 14.679 -10
  [4,1,-4.769,13.914,-10,-5.2,12,-10,-7.2,12,-10,-6.617,14.679,-10],
// 4 1 -5.05 16.95 -10 -3.635 15.536 -10 -4.769 13.914 -10 -6.617 14.679 -10
  [4,1,-5.05,16.95,-10,-3.635,15.536,-10,-4.769,13.914,-10,-6.617,14.679,-10],
// 4 1 -3.635 15.536 -10 -5.05 16.95 -10 -2.729 18.467 -10 -1.963 16.619 -10
  [4,1,-3.635,15.536,-10,-5.05,16.95,-10,-2.729,18.467,-10,-1.963,16.619,-10],
// 4 1 -1.963 16.619 -10 -2.729 18.467 -10 0 19 -10 0 17 -10
  [4,1,-1.963,16.619,-10,-2.729,18.467,-10,0,19,-10,0,17,-10],
// 4 1 0 17 -10 0 19 -10 2.729 18.467 -10 1.963 16.619 -10
  [4,1,0,17,-10,0,19,-10,2.729,18.467,-10,1.963,16.619,-10],
// 4 1 1.963 16.619 -10 2.729 18.467 -10 3.35 18.1 -10 4.9 17.1 -10
  [4,1,1.963,16.619,-10,2.729,18.467,-10,3.35,18.1,-10,4.9,17.1,-10],
// 4 1 3.635 15.536 -10 1.6 15.8 -10 1.963 16.619 -10 4.9 17.1 -10
  [4,1,3.635,15.536,-10,1.6,15.8,-10,1.963,16.619,-10,4.9,17.1,-10],
// 4 1 4.75 20 -10 6 19.5 -10 4.9 17.1 -10 3.35 18.1 -10
  [4,1,4.75,20,-10,6,19.5,-10,4.9,17.1,-10,3.35,18.1,-10],
// 4 1 3.635 15.536 -10 4.9 17.1 -10 6.617 14.679 -10 4.769 13.914 -10
  [4,1,3.635,15.536,-10,4.9,17.1,-10,6.617,14.679,-10,4.769,13.914,-10],
// 4 1 4.769 13.914 -10 6.617 14.679 -10 7.2 12 -10 5.2 12 -10
  [4,1,4.769,13.914,-10,6.617,14.679,-10,7.2,12,-10,5.2,12,-10],
// 4 16 6.617 9.321 -10 7.2 12 -10 10 12 -10 10 0 -10
  [4,16,6.617,9.321,-10,7.2,12,-10,10,12,-10,10,0,-10],
// 3 16 10 0 -10 5.05 7.05 -10 6.617 9.321 -10
  [3,16,10,0,-10,5.05,7.05,-10,6.617,9.321,-10],
// 4 16 2.729 5.533 -10 5.05 7.05 -10 10 0 -10 0 0 -10
  [4,16,2.729,5.533,-10,5.05,7.05,-10,10,0,-10,0,0,-10],
// 3 16 0 0 -10 0 5 -10 2.729 5.533 -10
  [3,16,0,0,-10,0,5,-10,2.729,5.533,-10],
// 4 16 -2.729 5.533 -10 0 5 -10 0 0 -10 -10 0 -10
  [4,16,-2.729,5.533,-10,0,5,-10,0,0,-10,-10,0,-10],
// 3 16 -10 0 -10 -5.05 7.05 -10 -2.729 5.533 -10
  [3,16,-10,0,-10,-5.05,7.05,-10,-2.729,5.533,-10],
// 4 16 -6.617 9.321 -10 -5.05 7.05 -10 -10 0 -10 -10 12 -10
  [4,16,-6.617,9.321,-10,-5.05,7.05,-10,-10,0,-10,-10,12,-10],
// 3 16 -6.617 9.321 -10 -10 12 -10 -7.2 12 -10
  [3,16,-6.617,9.321,-10,-10,12,-10,-7.2,12,-10],
// 4 16 -6.617 14.679 -10 -7.2 12 -10 -10 12 -10 -10 24 -10
  [4,16,-6.617,14.679,-10,-7.2,12,-10,-10,12,-10,-10,24,-10],
// 3 16 -6.617 14.679 -10 -10 24 -10 -5.05 16.95 -10
  [3,16,-6.617,14.679,-10,-10,24,-10,-5.05,16.95,-10],
// 4 16 -2.729 18.467 -10 -5.05 16.95 -10 -10 24 -10 0 24 -10
  [4,16,-2.729,18.467,-10,-5.05,16.95,-10,-10,24,-10,0,24,-10],
// 3 16 -2.729 18.467 -10 0 24 -10 0 19 -10
  [3,16,-2.729,18.467,-10,0,24,-10,0,19,-10],
// 4 16 2.729 18.467 -10 0 19 -10 0 24 -10 4.75 20 -10
  [4,16,2.729,18.467,-10,0,19,-10,0,24,-10,4.75,20,-10],
// 3 16 3.35 18.1 -10 2.729 18.467 -10 4.75 20 -10
  [3,16,3.35,18.1,-10,2.729,18.467,-10,4.75,20,-10],
// 4 16 10 24 -10 6 19.5 -10 4.75 20 -10 0 24 -10
  [4,16,10,24,-10,6,19.5,-10,4.75,20,-10,0,24,-10],
// 4 16 6.617 14.679 -10 4.9 17.1 -10 6 19.5 -10 10 24 -10
  [4,16,6.617,14.679,-10,4.9,17.1,-10,6,19.5,-10,10,24,-10],
// 4 16 7.2 12 -10 6.617 14.679 -10 10 24 -10 10 12 -10
  [4,16,7.2,12,-10,6.617,14.679,-10,10,24,-10,10,12,-10],
// 4 16 0 12 -10 5.2 12 -10 4.769 10.086 -10 3.635 8.464 -10
  [4,16,0,12,-10,5.2,12,-10,4.769,10.086,-10,3.635,8.464,-10],
// 4 16 0 12 -10 3.635 8.464 -10 2.063 7.38 -10 0 7 -10
  [4,16,0,12,-10,3.635,8.464,-10,2.063,7.38,-10,0,7,-10],
// 4 16 0 12 -10 0 7 -10 -1.963 7.38 -10 -3.635 8.464 -10
  [4,16,0,12,-10,0,7,-10,-1.963,7.38,-10,-3.635,8.464,-10],
// 4 16 0 12 -10 -3.635 8.464 -10 -4.769 10.086 -10 -5.2 12 -10
  [4,16,0,12,-10,-3.635,8.464,-10,-4.769,10.086,-10,-5.2,12,-10],
// 4 16 0 12 -10 -5.2 12 -10 -4.769 13.914 -10 -3.635 15.536 -10
  [4,16,0,12,-10,-5.2,12,-10,-4.769,13.914,-10,-3.635,15.536,-10],
// 4 16 0 12 -10 -3.635 15.536 -10 -1.963 16.619 -10 0 17 -10
  [4,16,0,12,-10,-3.635,15.536,-10,-1.963,16.619,-10,0,17,-10],
// 3 16 0 12 -10 0 17 -10 1.963 16.619 -10
  [3,16,0,12,-10,0,17,-10,1.963,16.619,-10],
// 3 16 0 12 -10 1.6 15.8 -10 1.963 16.619 -10
  [3,16,0,12,-10,1.6,15.8,-10,1.963,16.619,-10],
// 4 16 0 12 -10 1.6 15.8 -10 3.635 15.536 -10 4.769 13.914 -10
  [4,16,0,12,-10,1.6,15.8,-10,3.635,15.536,-10,4.769,13.914,-10],
// 3 16 5.2 12 -10 0 12 -10 4.769 13.914 -10
  [3,16,5.2,12,-10,0,12,-10,4.769,13.914,-10],
// 
// 0 // Subfile
// 1 16 0 0 0 1 0 0 0 1 0 0 0 1 s\3005s01.dat
  [1,16,0,0,0,1,0,0,0,1,0,0,0,1, ldraw_lib__s__3005s01(realsolid)],
];
module ldraw_lib__3005ptq(step=0, col=false, unit=2/5, alt=false, line=0.2, solid=!$preview)
    makepoly(ldraw_lib__3005ptq(solid), step=step, col=col, unit=unit, alt=alt, line=line, solid=solid);
ldraw_lib__3005ptq(line=0.2);
